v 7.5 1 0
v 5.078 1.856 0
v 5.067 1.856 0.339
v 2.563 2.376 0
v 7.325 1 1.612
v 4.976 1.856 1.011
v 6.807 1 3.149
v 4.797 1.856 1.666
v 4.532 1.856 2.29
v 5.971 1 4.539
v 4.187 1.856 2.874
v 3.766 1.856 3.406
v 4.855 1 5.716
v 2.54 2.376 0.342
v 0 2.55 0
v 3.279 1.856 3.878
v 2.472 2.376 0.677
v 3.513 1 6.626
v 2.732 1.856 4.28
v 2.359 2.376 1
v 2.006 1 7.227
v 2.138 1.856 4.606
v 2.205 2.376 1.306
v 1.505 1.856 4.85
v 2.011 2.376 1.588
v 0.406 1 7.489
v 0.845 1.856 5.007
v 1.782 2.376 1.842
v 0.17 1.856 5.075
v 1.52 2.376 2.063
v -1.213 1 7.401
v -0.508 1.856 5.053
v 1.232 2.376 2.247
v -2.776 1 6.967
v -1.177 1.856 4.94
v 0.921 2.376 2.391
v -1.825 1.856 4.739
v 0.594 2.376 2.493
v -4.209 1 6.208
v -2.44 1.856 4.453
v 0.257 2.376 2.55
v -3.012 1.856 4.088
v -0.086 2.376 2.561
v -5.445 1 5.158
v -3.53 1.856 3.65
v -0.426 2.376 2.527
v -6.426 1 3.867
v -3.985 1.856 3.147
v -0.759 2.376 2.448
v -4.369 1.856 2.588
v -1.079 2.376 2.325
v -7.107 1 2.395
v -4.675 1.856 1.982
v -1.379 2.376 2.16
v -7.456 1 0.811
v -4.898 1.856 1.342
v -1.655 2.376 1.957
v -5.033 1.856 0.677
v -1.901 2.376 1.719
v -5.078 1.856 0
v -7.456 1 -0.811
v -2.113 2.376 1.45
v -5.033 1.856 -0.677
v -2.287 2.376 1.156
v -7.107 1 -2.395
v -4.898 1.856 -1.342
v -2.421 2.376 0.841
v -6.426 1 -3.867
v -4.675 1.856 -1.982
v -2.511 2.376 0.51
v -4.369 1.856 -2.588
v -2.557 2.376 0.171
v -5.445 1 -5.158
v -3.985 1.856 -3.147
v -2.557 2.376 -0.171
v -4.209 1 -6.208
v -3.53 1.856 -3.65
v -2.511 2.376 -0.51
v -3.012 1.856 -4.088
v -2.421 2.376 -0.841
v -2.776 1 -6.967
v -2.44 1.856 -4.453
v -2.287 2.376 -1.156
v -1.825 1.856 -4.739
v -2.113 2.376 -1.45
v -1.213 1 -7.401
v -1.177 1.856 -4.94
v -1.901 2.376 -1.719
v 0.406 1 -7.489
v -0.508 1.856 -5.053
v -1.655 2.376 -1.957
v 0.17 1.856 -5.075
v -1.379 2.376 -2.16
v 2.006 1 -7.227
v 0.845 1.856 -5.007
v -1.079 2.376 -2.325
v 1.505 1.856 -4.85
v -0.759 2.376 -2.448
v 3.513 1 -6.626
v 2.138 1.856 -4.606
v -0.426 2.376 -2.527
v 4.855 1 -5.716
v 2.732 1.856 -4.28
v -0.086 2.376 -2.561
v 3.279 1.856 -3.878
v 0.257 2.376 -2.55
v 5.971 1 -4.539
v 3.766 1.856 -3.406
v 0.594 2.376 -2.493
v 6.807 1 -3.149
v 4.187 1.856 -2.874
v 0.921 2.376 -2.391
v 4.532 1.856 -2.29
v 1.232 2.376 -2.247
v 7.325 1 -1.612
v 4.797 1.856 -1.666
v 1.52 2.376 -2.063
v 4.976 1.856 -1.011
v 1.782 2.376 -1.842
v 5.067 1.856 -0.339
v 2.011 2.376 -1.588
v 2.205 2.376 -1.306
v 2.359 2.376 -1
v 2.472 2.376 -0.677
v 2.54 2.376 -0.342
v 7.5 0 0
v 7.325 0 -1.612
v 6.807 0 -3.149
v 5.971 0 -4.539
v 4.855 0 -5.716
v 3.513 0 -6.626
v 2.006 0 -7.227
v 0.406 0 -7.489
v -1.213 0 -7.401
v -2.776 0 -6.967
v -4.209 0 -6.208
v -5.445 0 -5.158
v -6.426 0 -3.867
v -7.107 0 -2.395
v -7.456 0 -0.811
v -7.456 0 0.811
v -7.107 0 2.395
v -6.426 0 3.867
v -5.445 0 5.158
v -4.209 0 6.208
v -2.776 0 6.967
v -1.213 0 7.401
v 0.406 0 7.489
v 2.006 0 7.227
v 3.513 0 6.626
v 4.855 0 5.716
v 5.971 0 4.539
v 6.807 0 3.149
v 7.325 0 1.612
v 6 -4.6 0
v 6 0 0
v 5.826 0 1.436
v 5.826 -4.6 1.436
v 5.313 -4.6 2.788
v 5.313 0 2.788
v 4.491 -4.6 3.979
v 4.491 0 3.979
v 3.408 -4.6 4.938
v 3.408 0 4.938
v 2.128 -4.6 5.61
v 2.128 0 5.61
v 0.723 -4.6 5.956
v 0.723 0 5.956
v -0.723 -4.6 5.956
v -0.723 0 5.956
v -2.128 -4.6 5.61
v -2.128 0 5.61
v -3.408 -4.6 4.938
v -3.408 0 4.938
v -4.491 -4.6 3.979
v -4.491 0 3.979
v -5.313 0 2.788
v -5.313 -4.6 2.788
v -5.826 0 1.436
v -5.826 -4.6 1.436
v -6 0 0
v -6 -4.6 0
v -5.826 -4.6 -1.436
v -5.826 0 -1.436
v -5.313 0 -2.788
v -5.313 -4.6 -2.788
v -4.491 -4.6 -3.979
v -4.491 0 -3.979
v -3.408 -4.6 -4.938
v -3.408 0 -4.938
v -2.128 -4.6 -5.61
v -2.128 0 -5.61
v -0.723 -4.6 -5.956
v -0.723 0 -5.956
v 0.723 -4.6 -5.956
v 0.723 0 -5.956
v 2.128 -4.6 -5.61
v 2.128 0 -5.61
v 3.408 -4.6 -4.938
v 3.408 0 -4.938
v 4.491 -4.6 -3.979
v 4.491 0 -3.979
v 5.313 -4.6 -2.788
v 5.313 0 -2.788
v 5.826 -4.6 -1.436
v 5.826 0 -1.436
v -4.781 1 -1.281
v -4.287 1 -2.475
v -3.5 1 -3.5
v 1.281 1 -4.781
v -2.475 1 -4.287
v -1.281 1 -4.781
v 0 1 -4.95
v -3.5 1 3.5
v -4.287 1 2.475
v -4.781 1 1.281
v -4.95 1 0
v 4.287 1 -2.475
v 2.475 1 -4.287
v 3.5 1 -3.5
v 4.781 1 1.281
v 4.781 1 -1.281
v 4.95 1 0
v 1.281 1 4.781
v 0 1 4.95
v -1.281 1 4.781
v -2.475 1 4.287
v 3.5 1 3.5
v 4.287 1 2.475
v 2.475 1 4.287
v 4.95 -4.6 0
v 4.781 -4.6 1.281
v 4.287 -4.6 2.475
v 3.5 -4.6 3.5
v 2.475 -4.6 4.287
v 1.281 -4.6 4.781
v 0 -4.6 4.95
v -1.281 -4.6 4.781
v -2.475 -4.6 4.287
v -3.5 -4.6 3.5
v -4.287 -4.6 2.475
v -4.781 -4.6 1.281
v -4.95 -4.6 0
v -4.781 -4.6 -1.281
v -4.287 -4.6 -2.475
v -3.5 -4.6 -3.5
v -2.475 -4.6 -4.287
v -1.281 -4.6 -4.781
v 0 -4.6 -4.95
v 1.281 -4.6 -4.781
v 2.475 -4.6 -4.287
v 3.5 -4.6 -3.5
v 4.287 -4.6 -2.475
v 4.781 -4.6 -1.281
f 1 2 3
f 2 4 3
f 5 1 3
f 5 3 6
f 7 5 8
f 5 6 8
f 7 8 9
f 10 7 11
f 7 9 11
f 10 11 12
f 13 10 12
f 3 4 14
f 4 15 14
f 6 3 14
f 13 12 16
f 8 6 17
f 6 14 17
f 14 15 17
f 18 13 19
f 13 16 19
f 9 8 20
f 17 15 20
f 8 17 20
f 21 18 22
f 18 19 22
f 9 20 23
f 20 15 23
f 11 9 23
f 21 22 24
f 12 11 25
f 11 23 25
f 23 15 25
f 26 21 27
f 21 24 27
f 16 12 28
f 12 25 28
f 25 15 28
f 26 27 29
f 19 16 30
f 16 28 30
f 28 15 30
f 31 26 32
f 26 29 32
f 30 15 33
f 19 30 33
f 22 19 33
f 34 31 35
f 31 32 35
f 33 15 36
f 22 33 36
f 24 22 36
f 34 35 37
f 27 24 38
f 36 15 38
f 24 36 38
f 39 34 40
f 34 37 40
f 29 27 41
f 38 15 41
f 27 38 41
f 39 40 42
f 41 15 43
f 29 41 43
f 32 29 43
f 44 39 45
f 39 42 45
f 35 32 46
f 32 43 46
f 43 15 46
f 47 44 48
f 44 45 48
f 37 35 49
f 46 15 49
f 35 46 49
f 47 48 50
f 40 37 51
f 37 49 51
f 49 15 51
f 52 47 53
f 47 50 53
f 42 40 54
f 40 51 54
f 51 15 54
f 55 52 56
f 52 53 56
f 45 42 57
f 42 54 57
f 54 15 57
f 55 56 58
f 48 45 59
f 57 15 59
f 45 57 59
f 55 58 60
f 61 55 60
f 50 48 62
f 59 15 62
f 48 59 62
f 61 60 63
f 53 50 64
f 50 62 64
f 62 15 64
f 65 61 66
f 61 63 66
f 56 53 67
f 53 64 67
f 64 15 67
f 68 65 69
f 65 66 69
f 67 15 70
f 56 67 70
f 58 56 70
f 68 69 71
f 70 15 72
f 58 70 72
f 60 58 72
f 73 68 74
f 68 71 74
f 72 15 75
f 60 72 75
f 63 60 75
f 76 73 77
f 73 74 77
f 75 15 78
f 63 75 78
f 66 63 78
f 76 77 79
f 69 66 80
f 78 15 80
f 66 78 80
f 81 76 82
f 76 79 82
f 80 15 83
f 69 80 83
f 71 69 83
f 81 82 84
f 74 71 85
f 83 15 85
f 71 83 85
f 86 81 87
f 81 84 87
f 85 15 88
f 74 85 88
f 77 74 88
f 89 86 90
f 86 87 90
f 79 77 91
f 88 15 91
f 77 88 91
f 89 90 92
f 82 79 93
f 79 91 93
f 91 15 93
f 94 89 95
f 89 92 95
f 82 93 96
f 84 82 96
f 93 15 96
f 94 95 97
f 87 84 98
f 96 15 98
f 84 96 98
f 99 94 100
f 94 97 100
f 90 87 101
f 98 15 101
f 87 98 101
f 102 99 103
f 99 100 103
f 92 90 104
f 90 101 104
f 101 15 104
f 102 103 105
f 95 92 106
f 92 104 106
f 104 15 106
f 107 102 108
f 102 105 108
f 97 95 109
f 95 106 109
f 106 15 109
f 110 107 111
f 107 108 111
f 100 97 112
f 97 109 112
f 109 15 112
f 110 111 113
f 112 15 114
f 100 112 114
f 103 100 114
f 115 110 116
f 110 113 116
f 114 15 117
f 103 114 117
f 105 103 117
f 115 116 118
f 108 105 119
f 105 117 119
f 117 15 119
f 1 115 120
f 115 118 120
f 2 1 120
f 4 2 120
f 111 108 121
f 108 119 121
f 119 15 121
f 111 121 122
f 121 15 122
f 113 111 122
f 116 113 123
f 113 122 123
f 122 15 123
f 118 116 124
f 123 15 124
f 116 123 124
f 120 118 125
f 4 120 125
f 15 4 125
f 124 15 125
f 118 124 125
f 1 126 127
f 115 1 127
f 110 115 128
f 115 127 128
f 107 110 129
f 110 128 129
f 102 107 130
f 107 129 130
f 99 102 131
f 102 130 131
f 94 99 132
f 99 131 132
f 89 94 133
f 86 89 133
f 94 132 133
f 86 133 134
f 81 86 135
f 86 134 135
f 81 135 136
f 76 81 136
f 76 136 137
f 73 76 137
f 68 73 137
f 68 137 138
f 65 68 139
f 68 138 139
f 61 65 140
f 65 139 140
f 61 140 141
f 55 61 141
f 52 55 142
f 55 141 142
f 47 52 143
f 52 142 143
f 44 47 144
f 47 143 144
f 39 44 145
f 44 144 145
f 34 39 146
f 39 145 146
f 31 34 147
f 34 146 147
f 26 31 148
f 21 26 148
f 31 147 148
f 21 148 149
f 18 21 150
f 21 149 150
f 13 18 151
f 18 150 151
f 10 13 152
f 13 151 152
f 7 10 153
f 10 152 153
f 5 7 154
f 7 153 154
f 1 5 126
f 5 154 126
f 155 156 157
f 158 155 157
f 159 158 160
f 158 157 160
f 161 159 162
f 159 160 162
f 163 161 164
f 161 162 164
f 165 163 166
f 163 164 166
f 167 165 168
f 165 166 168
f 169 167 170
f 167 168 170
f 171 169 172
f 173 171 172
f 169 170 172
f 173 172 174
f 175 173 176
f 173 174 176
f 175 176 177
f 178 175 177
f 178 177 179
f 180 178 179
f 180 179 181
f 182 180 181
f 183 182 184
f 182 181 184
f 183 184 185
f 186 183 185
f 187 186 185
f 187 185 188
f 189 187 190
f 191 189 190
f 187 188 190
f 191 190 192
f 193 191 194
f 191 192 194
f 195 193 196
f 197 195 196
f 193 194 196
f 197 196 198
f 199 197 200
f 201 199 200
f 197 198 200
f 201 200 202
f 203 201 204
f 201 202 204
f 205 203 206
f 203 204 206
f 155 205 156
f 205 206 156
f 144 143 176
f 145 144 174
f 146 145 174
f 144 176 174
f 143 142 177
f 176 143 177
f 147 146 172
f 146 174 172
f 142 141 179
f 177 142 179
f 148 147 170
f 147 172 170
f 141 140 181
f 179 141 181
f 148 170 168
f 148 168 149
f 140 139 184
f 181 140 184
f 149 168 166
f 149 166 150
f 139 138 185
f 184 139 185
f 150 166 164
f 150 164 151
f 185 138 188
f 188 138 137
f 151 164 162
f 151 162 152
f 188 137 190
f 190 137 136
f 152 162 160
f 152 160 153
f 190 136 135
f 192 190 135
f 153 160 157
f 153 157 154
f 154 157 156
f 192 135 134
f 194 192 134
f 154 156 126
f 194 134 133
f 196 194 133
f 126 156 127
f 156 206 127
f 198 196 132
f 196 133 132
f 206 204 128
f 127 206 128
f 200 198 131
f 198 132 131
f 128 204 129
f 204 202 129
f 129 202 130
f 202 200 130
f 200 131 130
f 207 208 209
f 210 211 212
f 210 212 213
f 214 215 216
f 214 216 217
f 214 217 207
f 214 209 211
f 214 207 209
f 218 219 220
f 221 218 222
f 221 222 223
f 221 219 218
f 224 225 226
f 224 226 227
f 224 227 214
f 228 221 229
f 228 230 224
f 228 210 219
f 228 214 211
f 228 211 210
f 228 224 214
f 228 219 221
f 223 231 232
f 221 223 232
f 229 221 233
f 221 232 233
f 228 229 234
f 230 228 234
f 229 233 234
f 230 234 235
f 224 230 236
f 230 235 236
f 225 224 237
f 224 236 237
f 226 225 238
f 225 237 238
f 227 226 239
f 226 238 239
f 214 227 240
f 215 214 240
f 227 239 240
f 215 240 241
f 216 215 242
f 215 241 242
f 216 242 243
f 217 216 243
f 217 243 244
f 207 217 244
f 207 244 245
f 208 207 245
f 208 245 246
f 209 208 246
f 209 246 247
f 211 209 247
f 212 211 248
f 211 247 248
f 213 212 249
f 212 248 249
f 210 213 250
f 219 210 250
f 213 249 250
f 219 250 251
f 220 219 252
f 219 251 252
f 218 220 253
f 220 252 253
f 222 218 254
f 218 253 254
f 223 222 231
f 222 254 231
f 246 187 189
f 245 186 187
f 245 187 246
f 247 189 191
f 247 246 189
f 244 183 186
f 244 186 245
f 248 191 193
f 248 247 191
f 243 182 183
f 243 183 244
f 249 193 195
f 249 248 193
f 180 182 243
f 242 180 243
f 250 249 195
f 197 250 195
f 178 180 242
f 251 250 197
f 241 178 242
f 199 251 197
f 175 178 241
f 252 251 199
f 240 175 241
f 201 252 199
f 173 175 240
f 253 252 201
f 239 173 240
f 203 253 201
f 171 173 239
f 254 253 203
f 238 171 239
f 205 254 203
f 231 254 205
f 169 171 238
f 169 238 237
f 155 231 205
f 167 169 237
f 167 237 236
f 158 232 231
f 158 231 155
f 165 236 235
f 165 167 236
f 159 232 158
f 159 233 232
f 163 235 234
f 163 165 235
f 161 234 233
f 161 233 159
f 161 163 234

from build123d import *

# Parameters (mm, degrees)
SKETCH1_R           = 7.5
BOSS_EXTRUDE1_DEPTH = 1
SKETCH4_R           = 6
BOSS_EXTRUDE2_DEPTH = 4.6
SKETCH5_R           = 4.95
CUT_EXTRUDE1_DEPTH  = 5.6


with BuildPart() as part:
    # Sketch1 → Boss-Extrude1 (new body)
    with BuildSketch(Plane(origin=(0, 0, 0), x_dir=(1, 0, 0), z_dir=(0, 1, 0))):
        Circle(SKETCH1_R)
    extrude(amount=BOSS_EXTRUDE1_DEPTH)

    # Sketch2 one side → Revolve1 (revolve)
    with BuildSketch(Plane.XY):
        with BuildLine():
            Line((0, 1), (7.5, 1))
            ThreePointArc((7.5, 1), (3.829246009, 2.158448432), (0, 2.55))
            Line((0, 2.55), (0, 1))
        make_face()
    revolve(axis=Axis((0, 2.55, 0), (0, -1, 0)))

    # Sketch4 → Boss-Extrude2 (add)
    with BuildSketch(Plane.XZ):
        Circle(SKETCH4_R)
    extrude(amount=BOSS_EXTRUDE2_DEPTH)

    # Sketch5 → Cut-Extrude1 (cut)
    with BuildSketch(Plane.XZ.offset(4.6)):
        Circle(SKETCH5_R)
    extrude(amount=-CUT_EXTRUDE1_DEPTH, mode=Mode.SUBTRACT)


solid = part.part
